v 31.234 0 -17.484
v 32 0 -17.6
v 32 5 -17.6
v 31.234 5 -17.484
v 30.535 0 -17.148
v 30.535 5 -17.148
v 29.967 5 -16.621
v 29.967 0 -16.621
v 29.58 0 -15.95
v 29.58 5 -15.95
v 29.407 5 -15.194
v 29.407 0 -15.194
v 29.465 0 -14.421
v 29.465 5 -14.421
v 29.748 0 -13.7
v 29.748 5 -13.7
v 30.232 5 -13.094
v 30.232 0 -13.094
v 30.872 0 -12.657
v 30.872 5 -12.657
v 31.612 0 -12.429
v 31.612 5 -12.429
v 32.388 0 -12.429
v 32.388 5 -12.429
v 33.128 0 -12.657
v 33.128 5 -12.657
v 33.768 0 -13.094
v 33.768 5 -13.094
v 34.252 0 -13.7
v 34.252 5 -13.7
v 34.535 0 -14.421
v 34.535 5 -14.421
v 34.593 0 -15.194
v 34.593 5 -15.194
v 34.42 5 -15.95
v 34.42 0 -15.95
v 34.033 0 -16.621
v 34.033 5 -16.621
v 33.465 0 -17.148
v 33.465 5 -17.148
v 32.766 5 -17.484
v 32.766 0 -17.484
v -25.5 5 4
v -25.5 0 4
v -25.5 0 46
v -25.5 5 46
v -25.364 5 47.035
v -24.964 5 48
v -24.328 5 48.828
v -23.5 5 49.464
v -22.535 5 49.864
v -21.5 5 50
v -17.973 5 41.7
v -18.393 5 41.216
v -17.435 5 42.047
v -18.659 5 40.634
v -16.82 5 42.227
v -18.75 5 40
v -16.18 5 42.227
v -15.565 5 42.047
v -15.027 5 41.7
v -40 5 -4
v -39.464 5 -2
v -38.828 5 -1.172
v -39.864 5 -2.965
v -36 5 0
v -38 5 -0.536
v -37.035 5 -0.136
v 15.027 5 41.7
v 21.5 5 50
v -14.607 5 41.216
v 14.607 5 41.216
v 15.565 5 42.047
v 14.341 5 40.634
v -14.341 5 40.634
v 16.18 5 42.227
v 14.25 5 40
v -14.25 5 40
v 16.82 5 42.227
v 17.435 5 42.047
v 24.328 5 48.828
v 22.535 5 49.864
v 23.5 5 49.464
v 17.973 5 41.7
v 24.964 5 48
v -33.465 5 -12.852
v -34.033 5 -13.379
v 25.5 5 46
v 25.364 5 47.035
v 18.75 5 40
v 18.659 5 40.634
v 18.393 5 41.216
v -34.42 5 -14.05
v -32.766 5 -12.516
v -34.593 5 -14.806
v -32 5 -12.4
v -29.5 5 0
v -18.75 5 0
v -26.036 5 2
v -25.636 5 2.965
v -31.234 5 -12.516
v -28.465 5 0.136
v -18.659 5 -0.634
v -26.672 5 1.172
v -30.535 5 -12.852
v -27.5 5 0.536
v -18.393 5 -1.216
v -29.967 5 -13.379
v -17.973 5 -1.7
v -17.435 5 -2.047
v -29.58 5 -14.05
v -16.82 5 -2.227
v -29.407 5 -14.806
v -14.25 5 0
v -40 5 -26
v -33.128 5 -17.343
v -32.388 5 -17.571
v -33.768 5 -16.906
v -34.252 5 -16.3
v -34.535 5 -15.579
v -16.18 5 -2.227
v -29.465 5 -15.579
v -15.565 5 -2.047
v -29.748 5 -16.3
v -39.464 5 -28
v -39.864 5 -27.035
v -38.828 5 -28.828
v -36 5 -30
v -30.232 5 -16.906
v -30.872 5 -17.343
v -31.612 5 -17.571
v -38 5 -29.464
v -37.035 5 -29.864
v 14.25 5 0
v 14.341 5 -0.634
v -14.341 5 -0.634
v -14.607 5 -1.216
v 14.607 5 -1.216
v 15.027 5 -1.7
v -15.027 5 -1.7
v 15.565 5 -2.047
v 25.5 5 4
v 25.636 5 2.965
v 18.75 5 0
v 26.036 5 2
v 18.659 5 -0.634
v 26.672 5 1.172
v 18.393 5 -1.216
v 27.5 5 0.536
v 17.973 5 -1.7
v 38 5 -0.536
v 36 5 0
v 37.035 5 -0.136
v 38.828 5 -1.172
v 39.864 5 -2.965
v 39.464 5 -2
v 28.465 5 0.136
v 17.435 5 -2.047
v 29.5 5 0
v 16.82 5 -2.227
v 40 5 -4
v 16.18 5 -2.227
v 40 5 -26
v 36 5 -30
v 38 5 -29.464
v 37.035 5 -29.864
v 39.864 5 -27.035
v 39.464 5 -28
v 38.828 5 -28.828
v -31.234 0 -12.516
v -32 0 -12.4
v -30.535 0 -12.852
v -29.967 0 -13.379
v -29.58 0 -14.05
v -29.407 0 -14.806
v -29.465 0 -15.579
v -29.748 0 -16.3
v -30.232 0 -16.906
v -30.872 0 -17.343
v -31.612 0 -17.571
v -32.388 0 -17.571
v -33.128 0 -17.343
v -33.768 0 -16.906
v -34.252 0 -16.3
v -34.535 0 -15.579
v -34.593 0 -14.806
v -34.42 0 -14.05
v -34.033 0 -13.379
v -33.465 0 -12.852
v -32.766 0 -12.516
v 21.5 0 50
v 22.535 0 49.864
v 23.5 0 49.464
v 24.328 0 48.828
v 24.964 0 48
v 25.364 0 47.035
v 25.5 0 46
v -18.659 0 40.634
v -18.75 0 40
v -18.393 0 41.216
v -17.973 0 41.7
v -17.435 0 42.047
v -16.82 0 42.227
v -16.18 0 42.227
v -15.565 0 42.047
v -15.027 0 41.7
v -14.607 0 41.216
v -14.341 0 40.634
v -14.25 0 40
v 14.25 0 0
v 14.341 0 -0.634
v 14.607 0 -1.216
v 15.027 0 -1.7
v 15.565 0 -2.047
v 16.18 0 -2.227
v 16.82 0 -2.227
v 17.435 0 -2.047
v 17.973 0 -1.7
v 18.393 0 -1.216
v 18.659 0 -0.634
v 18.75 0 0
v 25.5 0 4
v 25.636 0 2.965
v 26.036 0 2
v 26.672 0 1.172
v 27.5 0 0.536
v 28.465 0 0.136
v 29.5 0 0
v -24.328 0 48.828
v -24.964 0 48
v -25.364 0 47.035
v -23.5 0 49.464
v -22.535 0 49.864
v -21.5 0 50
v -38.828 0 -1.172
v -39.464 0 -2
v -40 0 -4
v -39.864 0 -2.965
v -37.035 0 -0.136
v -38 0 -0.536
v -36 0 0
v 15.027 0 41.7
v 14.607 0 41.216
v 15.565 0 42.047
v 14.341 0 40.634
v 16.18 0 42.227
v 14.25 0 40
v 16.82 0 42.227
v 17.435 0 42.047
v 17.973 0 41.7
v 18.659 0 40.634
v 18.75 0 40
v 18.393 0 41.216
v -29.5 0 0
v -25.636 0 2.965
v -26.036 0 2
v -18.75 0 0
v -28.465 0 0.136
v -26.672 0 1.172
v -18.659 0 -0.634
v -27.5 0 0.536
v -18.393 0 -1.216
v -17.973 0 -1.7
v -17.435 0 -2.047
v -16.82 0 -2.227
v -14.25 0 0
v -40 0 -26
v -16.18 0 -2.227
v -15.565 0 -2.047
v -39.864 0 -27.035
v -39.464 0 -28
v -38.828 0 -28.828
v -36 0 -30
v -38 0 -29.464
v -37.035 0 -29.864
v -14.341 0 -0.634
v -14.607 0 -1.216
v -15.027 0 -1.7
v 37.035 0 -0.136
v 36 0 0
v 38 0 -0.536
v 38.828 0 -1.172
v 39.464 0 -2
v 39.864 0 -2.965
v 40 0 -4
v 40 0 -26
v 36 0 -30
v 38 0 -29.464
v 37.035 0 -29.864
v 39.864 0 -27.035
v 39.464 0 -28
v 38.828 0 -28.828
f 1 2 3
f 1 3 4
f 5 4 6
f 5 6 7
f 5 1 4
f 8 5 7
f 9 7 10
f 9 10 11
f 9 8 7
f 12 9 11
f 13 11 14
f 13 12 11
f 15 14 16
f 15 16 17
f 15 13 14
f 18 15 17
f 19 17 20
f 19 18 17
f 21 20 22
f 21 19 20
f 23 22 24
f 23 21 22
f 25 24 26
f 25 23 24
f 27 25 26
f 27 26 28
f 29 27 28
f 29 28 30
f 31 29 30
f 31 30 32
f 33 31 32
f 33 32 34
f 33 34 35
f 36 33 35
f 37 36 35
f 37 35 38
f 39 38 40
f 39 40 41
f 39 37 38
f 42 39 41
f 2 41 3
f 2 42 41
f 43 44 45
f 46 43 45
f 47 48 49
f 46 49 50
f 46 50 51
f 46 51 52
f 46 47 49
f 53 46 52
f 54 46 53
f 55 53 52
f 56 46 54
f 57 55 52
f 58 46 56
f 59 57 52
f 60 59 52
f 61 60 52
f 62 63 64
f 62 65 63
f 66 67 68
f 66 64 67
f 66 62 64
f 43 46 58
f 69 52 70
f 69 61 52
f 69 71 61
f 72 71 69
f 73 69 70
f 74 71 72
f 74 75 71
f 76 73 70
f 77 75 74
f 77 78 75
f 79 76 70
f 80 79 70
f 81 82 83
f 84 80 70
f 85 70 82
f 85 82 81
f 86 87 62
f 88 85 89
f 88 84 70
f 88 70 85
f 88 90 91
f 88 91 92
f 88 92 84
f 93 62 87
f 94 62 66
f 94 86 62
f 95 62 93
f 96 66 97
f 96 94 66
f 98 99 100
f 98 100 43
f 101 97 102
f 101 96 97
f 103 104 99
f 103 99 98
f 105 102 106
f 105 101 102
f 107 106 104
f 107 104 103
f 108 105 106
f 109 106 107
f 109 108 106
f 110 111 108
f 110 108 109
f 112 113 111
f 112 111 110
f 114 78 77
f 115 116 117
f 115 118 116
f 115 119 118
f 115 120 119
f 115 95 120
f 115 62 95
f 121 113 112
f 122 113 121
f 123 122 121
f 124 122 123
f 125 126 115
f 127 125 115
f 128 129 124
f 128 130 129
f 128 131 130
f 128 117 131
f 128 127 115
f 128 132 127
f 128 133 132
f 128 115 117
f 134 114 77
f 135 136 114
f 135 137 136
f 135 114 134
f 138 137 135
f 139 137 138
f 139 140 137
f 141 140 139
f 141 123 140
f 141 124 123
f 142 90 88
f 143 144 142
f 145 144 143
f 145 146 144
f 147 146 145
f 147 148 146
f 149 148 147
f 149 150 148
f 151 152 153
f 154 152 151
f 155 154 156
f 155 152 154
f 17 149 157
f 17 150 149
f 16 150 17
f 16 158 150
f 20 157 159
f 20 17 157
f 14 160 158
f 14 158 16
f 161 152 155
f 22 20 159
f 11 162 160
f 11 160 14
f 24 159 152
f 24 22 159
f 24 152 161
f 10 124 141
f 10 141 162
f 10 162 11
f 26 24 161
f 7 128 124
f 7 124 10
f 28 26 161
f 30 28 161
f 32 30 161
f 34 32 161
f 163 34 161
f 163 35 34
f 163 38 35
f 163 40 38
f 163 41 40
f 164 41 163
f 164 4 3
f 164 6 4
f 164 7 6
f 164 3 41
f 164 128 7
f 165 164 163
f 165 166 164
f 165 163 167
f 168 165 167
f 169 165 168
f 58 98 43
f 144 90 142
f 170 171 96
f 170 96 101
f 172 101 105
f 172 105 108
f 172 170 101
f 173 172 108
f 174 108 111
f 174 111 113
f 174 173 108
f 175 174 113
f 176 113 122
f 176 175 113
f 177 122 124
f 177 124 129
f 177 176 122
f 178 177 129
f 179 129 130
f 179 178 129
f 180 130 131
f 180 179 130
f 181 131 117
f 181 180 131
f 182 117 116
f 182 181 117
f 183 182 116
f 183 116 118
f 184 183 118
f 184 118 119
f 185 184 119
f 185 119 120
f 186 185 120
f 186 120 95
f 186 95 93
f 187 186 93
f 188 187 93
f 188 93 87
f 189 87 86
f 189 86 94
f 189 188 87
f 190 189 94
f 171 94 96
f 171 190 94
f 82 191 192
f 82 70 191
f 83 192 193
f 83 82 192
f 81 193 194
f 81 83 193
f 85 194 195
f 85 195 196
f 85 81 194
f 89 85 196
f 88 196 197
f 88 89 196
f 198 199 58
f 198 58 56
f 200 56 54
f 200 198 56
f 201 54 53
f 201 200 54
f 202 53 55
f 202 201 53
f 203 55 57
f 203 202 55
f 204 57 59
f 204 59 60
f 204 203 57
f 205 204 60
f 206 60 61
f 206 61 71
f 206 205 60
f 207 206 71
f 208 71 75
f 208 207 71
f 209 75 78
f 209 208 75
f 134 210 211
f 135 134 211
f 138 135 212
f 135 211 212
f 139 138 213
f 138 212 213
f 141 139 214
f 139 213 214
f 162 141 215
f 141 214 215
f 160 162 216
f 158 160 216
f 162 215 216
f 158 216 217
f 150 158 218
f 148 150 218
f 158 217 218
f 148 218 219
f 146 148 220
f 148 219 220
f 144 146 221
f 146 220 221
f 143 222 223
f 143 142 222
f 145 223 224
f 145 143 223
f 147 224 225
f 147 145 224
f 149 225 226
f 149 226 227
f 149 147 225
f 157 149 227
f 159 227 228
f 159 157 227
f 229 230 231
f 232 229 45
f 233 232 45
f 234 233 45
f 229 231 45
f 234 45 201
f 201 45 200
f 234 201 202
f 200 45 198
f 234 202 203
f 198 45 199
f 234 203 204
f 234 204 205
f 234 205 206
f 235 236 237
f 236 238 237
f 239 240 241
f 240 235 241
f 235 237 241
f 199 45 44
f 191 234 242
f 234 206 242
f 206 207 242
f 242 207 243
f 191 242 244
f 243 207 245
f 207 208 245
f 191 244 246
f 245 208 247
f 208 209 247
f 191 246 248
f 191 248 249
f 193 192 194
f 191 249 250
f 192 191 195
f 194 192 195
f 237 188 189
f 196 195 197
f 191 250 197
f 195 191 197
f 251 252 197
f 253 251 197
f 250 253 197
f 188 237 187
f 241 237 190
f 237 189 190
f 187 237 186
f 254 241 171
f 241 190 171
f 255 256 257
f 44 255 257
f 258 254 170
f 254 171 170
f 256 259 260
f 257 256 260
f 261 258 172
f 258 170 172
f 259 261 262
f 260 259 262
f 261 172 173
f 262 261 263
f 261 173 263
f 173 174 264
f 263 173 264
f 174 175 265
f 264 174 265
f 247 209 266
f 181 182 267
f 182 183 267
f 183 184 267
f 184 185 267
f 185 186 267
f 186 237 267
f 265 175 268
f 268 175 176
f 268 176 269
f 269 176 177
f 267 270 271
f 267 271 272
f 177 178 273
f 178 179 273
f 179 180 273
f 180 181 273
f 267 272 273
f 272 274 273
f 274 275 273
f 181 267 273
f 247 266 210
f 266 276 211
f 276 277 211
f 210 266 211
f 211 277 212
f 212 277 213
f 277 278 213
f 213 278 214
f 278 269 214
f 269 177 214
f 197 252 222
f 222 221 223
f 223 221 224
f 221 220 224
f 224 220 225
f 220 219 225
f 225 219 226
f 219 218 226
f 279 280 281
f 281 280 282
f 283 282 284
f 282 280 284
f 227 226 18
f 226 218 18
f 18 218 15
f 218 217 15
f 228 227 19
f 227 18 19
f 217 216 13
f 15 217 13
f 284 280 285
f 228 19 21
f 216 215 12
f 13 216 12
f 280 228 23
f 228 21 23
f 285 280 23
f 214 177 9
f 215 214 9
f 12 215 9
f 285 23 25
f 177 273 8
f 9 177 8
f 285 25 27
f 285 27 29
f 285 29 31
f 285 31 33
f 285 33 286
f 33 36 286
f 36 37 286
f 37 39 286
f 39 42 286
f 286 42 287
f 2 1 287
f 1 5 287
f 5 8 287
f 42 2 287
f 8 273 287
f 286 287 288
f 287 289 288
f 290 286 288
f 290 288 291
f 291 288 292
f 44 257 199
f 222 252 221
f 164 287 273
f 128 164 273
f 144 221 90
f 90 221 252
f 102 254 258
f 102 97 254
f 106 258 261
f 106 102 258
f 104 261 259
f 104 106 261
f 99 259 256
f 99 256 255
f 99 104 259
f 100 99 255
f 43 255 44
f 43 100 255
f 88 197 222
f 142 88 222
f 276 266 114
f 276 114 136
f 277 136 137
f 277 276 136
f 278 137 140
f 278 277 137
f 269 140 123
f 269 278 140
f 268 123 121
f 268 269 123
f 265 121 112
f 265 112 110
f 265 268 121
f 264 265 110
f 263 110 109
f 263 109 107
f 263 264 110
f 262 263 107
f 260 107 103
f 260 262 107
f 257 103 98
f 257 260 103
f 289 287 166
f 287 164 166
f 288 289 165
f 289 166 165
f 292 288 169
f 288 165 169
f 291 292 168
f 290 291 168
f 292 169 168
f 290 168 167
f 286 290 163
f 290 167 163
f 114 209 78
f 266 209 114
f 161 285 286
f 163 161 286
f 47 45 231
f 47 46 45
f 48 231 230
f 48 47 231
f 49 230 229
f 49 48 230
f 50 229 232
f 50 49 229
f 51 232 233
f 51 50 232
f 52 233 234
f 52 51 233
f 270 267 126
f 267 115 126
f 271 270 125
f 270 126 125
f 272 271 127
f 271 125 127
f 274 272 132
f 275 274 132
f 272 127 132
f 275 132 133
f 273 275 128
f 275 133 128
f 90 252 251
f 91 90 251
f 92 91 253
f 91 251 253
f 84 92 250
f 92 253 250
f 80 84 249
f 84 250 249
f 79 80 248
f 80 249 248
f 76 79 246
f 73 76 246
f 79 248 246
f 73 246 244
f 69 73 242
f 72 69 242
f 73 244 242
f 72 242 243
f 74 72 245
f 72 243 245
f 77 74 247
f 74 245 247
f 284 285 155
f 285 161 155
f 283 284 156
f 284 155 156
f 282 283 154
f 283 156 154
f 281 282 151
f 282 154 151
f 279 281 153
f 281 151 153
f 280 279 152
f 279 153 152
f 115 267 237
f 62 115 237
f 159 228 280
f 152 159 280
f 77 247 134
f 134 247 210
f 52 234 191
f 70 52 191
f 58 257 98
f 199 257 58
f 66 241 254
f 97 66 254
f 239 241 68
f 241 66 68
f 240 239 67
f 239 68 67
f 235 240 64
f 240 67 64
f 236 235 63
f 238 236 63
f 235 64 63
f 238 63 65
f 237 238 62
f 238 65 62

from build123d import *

# Parameters (mm, degrees)
SKETCH_1_R      = 2.6
EXTRUDE_1_DEPTH = 5
FILLET_1_R      = 4


with BuildPart() as part:
    # 草图1 → 凸台-拉伸1 (new body)
    with BuildSketch(Plane(origin=(0, 0, 0), x_dir=(1, 0, 0), z_dir=(0, 1, 0))):
        Polygon((-40, 0), (-25.5, 0), (-25.5, -50), (25.5, -50), (25.5, 0), (40, 0), (40, 30), (-40, 30), align=None)
        with Locations(Location((-32, 15, 0), (0, 0, 270))):
            Circle(SKETCH_1_R, mode=Mode.SUBTRACT)
        with Locations(Location((32, 15, 0), (0, 0, 90))):
            Circle(SKETCH_1_R, mode=Mode.SUBTRACT)
        with BuildLine():
            Line((18.75, 0), (18.75, -40))
            ThreePointArc((18.75, -40), (16.5, -42.25), (14.25, -40))
            Line((14.25, -40), (14.25, 0))
            ThreePointArc((14.25, 0), (16.5, 2.25), (18.75, 0))
        make_face(mode=Mode.SUBTRACT)
        with BuildLine():
            Line((-18.75, 0), (-18.75, -40))
            ThreePointArc((-18.75, -40), (-16.5, -42.25), (-14.25, -40))
            Line((-14.25, -40), (-14.25, 0))
            ThreePointArc((-14.25, 0), (-16.5, 2.25), (-18.75, 0))
        make_face(mode=Mode.SUBTRACT)
    extrude(amount=EXTRUDE_1_DEPTH)

    # 圆角1
    fillet_1_edges = [part.edges().sort_by_distance(p)[0] for p in [
        (-40, 2.5, -30),
        (40, 2.5, -30),
        (40, 2.5, 0),
        (25.5, 2.5, 0),
        (25.5, 2.5, 50),
        (-25.5, 2.5, 50),
        (-25.5, 2.5, 0),
        (-40, 2.5, 0),
    ]]
    fillet(fillet_1_edges, radius=FILLET_1_R)


solid = part.part
